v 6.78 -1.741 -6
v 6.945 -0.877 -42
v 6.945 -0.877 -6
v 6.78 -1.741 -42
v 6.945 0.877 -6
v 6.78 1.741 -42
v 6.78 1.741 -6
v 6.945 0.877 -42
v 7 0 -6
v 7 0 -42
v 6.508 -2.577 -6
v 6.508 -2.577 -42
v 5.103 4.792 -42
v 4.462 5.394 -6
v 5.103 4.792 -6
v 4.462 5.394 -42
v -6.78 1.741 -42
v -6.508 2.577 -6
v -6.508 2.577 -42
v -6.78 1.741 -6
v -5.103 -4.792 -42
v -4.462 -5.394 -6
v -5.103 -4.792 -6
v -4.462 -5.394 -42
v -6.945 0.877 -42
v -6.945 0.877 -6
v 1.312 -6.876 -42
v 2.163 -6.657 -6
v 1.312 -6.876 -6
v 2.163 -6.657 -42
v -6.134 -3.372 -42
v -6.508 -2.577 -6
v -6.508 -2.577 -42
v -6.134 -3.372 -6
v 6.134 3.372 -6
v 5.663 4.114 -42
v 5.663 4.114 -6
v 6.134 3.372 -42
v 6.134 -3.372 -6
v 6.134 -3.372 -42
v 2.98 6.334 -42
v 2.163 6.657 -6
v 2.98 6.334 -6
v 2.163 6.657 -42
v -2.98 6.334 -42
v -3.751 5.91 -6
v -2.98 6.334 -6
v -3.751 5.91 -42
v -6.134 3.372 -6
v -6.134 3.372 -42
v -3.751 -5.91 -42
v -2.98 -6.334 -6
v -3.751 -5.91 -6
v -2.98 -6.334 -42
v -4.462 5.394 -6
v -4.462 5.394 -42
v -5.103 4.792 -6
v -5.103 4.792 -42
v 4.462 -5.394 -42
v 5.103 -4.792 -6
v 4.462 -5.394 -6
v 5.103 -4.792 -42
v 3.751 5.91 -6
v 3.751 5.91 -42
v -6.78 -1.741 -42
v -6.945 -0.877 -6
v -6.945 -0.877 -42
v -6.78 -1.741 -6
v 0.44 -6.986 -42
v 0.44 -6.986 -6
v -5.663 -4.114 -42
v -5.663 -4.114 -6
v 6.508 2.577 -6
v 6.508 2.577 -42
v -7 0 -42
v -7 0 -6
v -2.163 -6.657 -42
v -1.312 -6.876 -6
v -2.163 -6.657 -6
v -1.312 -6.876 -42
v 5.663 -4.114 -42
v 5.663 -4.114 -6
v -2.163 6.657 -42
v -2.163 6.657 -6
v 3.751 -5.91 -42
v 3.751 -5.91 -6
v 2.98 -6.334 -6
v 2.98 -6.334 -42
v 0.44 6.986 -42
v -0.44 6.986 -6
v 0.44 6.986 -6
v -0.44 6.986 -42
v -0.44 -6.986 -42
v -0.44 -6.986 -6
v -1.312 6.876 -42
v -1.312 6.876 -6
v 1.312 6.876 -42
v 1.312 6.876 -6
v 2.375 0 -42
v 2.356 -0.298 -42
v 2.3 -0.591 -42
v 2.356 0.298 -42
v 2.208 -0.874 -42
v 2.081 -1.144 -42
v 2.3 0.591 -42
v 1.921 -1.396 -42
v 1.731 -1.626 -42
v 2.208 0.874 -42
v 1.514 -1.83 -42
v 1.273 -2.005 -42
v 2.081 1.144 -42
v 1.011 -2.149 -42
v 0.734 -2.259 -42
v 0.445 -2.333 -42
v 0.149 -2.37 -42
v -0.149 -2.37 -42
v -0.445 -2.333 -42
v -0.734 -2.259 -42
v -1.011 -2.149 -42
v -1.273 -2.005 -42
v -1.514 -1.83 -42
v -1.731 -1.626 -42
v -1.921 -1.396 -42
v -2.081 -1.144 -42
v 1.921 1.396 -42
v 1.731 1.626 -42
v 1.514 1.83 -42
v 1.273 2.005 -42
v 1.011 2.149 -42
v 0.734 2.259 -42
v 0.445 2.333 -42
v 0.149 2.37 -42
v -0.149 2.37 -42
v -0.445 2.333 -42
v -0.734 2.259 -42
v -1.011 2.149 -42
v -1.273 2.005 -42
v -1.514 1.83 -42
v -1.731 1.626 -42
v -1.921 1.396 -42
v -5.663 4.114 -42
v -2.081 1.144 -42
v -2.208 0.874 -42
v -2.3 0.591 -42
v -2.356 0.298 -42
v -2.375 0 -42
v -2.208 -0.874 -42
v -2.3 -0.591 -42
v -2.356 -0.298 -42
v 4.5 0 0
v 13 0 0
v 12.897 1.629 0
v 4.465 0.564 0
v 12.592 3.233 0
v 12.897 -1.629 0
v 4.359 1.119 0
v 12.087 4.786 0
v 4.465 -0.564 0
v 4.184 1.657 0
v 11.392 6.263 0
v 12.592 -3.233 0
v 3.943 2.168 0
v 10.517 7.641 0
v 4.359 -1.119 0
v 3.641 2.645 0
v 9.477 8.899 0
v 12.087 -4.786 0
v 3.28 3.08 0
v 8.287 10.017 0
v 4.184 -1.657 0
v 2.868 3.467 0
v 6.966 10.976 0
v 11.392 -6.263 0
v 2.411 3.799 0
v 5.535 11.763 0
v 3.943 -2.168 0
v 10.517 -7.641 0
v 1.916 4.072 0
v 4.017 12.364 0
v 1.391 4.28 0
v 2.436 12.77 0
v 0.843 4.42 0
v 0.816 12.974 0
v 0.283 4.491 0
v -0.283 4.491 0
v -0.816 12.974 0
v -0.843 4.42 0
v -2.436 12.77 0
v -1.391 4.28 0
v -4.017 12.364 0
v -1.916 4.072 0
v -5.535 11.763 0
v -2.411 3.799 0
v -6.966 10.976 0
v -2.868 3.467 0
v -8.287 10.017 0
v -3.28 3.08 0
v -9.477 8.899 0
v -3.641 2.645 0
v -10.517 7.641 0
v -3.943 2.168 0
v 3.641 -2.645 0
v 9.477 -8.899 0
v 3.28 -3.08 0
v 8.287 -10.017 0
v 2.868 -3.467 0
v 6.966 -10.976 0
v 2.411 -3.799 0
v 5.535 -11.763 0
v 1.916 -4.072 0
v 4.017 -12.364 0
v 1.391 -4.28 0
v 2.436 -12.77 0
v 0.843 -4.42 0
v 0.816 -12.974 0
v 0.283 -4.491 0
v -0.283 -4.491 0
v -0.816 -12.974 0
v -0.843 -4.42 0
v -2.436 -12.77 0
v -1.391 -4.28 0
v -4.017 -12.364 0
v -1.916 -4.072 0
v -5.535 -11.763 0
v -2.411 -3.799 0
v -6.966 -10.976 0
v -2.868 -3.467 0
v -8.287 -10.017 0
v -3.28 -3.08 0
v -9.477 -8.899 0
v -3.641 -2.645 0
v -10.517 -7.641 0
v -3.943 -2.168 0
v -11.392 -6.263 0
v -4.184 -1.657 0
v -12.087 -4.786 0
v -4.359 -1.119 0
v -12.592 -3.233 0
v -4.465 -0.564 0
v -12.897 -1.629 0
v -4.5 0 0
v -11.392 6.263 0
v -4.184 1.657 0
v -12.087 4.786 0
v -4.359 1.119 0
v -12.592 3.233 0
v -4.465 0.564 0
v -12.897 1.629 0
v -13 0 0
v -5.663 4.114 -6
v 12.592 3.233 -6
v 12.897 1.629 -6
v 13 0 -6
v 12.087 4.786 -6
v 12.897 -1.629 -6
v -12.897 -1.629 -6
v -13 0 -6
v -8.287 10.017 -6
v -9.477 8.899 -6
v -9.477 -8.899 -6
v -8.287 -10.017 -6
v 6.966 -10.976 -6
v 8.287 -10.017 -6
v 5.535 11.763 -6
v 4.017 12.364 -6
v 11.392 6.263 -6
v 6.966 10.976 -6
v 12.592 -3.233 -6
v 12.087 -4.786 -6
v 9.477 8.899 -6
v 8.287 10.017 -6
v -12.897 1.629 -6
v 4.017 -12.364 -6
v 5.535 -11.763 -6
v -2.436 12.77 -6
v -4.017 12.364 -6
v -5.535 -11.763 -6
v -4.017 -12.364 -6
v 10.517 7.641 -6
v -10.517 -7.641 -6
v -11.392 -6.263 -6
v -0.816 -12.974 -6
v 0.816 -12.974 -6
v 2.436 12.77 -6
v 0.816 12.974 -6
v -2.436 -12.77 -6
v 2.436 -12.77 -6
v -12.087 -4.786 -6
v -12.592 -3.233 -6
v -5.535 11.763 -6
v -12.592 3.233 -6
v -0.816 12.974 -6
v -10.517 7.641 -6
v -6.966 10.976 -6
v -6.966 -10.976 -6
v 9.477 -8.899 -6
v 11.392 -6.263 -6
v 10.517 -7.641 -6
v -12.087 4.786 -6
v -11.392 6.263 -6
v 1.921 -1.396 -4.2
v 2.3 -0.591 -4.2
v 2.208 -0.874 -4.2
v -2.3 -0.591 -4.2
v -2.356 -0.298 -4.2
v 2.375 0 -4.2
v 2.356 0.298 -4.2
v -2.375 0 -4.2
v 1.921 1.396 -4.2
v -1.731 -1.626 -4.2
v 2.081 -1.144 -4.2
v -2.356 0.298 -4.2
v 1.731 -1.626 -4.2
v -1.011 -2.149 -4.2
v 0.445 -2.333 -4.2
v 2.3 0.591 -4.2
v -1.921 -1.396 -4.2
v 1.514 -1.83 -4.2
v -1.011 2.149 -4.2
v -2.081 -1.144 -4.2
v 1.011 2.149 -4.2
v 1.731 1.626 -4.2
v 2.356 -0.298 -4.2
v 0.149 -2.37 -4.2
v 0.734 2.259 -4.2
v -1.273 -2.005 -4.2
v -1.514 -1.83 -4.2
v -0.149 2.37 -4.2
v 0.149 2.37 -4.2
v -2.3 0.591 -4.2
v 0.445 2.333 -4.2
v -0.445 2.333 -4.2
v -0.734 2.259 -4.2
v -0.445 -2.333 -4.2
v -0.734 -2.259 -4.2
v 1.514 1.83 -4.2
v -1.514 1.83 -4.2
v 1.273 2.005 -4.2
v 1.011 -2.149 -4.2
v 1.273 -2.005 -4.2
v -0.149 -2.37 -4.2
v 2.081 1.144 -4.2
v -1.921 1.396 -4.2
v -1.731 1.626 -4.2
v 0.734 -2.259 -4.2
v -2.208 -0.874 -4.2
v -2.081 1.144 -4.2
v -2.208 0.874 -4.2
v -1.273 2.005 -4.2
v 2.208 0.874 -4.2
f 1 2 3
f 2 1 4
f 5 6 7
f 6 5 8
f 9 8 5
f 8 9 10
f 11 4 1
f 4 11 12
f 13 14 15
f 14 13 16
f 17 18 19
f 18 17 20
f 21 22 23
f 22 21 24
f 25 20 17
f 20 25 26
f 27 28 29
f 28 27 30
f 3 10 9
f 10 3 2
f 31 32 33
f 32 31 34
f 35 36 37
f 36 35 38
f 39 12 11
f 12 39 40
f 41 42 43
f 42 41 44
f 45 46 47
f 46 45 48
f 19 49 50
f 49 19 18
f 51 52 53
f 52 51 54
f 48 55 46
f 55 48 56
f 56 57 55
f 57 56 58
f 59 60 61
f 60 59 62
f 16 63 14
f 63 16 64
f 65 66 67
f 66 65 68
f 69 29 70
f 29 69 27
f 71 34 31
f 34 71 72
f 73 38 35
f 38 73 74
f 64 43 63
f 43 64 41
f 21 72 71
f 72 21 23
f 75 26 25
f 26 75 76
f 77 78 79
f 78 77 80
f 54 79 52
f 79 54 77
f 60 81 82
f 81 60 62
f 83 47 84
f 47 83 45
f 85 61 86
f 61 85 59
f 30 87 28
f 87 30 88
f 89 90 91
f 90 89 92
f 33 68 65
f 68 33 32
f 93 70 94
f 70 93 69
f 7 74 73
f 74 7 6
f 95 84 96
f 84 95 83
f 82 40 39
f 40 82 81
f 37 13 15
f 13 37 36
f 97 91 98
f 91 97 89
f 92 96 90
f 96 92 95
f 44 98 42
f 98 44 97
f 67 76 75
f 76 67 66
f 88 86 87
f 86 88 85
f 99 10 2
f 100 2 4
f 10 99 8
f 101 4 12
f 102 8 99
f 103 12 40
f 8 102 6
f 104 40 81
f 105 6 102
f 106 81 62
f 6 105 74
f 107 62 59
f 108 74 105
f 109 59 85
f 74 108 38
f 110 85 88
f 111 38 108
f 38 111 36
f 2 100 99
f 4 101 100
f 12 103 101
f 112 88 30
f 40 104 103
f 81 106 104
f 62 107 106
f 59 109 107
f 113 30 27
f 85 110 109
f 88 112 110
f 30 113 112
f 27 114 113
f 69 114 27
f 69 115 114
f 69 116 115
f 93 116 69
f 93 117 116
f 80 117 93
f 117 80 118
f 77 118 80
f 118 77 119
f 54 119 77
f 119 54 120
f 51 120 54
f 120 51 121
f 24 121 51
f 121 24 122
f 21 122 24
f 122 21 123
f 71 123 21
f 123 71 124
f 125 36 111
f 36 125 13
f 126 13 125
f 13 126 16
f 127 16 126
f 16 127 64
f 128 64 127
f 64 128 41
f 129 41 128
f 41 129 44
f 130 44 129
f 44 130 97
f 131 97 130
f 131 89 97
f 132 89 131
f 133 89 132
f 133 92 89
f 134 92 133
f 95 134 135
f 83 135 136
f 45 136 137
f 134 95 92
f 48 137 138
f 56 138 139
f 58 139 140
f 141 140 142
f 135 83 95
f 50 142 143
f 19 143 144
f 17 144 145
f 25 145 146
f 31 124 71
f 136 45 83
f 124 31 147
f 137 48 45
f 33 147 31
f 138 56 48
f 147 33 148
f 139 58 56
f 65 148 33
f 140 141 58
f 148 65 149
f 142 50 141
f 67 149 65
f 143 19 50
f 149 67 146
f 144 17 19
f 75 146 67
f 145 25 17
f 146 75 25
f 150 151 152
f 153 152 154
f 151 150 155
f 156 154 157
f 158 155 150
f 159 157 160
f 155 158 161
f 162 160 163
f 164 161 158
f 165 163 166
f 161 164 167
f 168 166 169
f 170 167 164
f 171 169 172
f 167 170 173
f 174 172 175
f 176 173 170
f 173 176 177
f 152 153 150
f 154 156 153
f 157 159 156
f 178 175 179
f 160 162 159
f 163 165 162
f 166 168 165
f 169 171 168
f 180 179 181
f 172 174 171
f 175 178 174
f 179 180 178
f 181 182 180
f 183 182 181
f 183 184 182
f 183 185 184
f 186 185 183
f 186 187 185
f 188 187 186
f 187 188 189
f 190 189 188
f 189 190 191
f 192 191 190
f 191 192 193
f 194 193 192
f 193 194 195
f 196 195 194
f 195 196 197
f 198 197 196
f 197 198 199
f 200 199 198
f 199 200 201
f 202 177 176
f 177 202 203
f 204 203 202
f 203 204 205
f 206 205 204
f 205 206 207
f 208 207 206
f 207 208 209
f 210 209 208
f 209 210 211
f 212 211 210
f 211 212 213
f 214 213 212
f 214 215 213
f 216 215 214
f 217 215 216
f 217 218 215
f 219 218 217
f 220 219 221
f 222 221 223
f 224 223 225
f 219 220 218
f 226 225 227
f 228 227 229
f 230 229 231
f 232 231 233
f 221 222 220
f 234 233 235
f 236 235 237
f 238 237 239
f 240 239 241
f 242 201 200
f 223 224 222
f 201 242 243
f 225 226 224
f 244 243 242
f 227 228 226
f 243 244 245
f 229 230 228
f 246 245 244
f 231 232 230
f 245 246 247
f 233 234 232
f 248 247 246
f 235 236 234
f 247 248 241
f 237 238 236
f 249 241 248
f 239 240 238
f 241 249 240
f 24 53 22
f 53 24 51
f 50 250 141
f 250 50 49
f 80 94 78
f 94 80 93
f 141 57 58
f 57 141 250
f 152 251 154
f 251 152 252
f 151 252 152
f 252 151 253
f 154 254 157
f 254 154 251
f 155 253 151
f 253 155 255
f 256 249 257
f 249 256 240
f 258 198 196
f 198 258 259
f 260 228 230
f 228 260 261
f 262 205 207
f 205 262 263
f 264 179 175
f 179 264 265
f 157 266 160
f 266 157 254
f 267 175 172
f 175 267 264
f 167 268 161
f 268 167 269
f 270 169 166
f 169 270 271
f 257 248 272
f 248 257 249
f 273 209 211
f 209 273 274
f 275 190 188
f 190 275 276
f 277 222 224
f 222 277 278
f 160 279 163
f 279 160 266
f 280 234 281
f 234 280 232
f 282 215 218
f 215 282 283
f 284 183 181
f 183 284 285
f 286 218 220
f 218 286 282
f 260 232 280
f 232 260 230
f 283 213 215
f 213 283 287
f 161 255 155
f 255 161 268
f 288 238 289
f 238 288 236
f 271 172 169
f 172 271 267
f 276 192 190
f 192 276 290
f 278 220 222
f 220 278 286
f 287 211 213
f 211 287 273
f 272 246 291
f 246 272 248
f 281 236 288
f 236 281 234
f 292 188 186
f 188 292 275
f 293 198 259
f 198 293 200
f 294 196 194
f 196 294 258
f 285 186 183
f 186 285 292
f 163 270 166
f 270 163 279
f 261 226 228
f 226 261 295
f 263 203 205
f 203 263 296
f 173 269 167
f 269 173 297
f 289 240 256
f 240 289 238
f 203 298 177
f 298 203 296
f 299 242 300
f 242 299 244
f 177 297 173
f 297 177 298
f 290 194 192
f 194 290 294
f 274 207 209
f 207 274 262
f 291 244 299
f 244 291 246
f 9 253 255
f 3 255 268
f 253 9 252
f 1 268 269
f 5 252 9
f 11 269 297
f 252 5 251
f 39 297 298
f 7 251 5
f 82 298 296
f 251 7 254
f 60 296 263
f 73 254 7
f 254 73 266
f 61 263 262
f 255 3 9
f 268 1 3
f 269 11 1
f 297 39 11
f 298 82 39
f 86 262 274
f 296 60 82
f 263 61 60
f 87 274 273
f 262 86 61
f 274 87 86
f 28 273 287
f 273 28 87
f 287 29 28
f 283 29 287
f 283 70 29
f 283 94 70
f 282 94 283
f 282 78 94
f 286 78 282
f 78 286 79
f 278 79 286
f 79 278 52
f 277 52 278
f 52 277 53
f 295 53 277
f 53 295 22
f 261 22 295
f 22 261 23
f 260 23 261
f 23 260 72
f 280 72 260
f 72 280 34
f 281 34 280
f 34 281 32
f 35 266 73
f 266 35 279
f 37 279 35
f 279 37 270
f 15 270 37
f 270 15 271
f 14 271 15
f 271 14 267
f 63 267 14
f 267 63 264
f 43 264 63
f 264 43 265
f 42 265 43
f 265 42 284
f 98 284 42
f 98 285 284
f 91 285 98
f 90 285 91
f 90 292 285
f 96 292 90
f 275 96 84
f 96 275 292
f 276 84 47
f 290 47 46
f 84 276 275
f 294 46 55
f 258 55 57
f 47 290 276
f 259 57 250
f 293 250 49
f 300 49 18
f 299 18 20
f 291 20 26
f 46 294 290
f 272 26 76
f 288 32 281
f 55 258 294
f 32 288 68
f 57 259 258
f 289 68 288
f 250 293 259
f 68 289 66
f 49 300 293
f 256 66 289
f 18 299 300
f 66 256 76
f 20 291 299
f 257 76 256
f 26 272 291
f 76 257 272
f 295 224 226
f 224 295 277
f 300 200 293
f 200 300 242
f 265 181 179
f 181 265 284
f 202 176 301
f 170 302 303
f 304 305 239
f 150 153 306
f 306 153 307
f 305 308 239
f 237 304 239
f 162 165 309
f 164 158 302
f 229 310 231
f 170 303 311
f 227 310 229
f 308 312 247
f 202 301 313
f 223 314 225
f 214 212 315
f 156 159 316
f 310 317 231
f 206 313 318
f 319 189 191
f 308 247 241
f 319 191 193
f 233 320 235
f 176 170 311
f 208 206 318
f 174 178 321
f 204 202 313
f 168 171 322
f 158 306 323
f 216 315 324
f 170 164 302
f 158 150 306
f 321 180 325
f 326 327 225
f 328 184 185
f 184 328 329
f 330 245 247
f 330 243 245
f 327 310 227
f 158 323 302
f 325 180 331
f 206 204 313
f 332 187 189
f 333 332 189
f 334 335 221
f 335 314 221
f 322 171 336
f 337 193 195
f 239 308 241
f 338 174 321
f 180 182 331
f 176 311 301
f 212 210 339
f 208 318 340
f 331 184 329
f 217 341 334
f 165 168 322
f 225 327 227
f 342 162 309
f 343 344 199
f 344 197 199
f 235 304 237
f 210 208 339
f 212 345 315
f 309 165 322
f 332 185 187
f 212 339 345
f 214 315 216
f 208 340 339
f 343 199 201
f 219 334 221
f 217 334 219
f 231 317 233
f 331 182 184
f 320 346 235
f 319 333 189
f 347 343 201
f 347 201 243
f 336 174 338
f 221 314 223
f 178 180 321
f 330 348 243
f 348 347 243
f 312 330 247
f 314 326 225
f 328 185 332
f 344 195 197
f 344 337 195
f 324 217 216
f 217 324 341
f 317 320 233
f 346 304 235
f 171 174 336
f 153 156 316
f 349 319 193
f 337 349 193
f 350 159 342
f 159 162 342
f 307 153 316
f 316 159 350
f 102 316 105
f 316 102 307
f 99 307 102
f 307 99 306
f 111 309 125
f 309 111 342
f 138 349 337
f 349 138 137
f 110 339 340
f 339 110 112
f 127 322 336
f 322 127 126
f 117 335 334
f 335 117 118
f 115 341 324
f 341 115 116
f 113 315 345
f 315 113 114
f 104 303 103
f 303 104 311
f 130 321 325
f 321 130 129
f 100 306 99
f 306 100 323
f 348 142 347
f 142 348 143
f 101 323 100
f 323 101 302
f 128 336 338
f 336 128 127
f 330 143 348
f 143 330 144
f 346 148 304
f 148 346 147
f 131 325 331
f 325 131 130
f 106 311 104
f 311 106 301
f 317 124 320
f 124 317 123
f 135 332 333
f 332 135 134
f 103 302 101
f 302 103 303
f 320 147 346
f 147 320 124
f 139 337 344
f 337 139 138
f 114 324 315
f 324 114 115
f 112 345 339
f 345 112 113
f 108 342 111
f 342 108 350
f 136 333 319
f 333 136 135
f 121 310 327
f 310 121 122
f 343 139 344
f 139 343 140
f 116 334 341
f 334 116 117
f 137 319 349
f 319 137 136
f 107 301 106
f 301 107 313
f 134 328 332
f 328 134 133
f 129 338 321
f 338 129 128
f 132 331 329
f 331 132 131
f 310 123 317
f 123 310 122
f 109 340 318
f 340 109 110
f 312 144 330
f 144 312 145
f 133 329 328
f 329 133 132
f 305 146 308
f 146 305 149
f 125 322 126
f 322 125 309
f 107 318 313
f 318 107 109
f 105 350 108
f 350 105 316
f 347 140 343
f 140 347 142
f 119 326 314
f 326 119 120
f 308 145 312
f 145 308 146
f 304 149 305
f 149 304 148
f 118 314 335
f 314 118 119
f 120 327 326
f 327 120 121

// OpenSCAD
$fn = 50;


difference() {
	union() {
		translate(v = [0, 0, -42.0000000000]) {
			cylinder(h = 42, r = 7.0000000000);
		}
		translate(v = [0, 0, -6.0000000000]) {
			cylinder(h = 6, r = 13.0000000000);
		}
	}
	union() {
		translate(v = [0, 0, 0]) {
			rotate(a = [0, 0, 0]) {
				difference() {
					union() {
						#translate(v = [0, 0, -42.0000000000]) {
							cylinder(h = 42, r = 2.2500000000);
						}
						#translate(v = [0, 0, -4.2000000000]) {
							cylinder(h = 4.2000000000, r = 7.0000000000, r1 = 2.3750000000, r2 = 4.5000000000);
						}
						#translate(v = [0, 0, -42.0000000000]) {
							cylinder(h = 42, r = 2.3750000000);
						}
						#translate(v = [0, 0, -42.0000000000]) {
							cylinder(h = 42, r = 2.2500000000);
						}
					}
					union();
				}
			}
		}
	}
}
